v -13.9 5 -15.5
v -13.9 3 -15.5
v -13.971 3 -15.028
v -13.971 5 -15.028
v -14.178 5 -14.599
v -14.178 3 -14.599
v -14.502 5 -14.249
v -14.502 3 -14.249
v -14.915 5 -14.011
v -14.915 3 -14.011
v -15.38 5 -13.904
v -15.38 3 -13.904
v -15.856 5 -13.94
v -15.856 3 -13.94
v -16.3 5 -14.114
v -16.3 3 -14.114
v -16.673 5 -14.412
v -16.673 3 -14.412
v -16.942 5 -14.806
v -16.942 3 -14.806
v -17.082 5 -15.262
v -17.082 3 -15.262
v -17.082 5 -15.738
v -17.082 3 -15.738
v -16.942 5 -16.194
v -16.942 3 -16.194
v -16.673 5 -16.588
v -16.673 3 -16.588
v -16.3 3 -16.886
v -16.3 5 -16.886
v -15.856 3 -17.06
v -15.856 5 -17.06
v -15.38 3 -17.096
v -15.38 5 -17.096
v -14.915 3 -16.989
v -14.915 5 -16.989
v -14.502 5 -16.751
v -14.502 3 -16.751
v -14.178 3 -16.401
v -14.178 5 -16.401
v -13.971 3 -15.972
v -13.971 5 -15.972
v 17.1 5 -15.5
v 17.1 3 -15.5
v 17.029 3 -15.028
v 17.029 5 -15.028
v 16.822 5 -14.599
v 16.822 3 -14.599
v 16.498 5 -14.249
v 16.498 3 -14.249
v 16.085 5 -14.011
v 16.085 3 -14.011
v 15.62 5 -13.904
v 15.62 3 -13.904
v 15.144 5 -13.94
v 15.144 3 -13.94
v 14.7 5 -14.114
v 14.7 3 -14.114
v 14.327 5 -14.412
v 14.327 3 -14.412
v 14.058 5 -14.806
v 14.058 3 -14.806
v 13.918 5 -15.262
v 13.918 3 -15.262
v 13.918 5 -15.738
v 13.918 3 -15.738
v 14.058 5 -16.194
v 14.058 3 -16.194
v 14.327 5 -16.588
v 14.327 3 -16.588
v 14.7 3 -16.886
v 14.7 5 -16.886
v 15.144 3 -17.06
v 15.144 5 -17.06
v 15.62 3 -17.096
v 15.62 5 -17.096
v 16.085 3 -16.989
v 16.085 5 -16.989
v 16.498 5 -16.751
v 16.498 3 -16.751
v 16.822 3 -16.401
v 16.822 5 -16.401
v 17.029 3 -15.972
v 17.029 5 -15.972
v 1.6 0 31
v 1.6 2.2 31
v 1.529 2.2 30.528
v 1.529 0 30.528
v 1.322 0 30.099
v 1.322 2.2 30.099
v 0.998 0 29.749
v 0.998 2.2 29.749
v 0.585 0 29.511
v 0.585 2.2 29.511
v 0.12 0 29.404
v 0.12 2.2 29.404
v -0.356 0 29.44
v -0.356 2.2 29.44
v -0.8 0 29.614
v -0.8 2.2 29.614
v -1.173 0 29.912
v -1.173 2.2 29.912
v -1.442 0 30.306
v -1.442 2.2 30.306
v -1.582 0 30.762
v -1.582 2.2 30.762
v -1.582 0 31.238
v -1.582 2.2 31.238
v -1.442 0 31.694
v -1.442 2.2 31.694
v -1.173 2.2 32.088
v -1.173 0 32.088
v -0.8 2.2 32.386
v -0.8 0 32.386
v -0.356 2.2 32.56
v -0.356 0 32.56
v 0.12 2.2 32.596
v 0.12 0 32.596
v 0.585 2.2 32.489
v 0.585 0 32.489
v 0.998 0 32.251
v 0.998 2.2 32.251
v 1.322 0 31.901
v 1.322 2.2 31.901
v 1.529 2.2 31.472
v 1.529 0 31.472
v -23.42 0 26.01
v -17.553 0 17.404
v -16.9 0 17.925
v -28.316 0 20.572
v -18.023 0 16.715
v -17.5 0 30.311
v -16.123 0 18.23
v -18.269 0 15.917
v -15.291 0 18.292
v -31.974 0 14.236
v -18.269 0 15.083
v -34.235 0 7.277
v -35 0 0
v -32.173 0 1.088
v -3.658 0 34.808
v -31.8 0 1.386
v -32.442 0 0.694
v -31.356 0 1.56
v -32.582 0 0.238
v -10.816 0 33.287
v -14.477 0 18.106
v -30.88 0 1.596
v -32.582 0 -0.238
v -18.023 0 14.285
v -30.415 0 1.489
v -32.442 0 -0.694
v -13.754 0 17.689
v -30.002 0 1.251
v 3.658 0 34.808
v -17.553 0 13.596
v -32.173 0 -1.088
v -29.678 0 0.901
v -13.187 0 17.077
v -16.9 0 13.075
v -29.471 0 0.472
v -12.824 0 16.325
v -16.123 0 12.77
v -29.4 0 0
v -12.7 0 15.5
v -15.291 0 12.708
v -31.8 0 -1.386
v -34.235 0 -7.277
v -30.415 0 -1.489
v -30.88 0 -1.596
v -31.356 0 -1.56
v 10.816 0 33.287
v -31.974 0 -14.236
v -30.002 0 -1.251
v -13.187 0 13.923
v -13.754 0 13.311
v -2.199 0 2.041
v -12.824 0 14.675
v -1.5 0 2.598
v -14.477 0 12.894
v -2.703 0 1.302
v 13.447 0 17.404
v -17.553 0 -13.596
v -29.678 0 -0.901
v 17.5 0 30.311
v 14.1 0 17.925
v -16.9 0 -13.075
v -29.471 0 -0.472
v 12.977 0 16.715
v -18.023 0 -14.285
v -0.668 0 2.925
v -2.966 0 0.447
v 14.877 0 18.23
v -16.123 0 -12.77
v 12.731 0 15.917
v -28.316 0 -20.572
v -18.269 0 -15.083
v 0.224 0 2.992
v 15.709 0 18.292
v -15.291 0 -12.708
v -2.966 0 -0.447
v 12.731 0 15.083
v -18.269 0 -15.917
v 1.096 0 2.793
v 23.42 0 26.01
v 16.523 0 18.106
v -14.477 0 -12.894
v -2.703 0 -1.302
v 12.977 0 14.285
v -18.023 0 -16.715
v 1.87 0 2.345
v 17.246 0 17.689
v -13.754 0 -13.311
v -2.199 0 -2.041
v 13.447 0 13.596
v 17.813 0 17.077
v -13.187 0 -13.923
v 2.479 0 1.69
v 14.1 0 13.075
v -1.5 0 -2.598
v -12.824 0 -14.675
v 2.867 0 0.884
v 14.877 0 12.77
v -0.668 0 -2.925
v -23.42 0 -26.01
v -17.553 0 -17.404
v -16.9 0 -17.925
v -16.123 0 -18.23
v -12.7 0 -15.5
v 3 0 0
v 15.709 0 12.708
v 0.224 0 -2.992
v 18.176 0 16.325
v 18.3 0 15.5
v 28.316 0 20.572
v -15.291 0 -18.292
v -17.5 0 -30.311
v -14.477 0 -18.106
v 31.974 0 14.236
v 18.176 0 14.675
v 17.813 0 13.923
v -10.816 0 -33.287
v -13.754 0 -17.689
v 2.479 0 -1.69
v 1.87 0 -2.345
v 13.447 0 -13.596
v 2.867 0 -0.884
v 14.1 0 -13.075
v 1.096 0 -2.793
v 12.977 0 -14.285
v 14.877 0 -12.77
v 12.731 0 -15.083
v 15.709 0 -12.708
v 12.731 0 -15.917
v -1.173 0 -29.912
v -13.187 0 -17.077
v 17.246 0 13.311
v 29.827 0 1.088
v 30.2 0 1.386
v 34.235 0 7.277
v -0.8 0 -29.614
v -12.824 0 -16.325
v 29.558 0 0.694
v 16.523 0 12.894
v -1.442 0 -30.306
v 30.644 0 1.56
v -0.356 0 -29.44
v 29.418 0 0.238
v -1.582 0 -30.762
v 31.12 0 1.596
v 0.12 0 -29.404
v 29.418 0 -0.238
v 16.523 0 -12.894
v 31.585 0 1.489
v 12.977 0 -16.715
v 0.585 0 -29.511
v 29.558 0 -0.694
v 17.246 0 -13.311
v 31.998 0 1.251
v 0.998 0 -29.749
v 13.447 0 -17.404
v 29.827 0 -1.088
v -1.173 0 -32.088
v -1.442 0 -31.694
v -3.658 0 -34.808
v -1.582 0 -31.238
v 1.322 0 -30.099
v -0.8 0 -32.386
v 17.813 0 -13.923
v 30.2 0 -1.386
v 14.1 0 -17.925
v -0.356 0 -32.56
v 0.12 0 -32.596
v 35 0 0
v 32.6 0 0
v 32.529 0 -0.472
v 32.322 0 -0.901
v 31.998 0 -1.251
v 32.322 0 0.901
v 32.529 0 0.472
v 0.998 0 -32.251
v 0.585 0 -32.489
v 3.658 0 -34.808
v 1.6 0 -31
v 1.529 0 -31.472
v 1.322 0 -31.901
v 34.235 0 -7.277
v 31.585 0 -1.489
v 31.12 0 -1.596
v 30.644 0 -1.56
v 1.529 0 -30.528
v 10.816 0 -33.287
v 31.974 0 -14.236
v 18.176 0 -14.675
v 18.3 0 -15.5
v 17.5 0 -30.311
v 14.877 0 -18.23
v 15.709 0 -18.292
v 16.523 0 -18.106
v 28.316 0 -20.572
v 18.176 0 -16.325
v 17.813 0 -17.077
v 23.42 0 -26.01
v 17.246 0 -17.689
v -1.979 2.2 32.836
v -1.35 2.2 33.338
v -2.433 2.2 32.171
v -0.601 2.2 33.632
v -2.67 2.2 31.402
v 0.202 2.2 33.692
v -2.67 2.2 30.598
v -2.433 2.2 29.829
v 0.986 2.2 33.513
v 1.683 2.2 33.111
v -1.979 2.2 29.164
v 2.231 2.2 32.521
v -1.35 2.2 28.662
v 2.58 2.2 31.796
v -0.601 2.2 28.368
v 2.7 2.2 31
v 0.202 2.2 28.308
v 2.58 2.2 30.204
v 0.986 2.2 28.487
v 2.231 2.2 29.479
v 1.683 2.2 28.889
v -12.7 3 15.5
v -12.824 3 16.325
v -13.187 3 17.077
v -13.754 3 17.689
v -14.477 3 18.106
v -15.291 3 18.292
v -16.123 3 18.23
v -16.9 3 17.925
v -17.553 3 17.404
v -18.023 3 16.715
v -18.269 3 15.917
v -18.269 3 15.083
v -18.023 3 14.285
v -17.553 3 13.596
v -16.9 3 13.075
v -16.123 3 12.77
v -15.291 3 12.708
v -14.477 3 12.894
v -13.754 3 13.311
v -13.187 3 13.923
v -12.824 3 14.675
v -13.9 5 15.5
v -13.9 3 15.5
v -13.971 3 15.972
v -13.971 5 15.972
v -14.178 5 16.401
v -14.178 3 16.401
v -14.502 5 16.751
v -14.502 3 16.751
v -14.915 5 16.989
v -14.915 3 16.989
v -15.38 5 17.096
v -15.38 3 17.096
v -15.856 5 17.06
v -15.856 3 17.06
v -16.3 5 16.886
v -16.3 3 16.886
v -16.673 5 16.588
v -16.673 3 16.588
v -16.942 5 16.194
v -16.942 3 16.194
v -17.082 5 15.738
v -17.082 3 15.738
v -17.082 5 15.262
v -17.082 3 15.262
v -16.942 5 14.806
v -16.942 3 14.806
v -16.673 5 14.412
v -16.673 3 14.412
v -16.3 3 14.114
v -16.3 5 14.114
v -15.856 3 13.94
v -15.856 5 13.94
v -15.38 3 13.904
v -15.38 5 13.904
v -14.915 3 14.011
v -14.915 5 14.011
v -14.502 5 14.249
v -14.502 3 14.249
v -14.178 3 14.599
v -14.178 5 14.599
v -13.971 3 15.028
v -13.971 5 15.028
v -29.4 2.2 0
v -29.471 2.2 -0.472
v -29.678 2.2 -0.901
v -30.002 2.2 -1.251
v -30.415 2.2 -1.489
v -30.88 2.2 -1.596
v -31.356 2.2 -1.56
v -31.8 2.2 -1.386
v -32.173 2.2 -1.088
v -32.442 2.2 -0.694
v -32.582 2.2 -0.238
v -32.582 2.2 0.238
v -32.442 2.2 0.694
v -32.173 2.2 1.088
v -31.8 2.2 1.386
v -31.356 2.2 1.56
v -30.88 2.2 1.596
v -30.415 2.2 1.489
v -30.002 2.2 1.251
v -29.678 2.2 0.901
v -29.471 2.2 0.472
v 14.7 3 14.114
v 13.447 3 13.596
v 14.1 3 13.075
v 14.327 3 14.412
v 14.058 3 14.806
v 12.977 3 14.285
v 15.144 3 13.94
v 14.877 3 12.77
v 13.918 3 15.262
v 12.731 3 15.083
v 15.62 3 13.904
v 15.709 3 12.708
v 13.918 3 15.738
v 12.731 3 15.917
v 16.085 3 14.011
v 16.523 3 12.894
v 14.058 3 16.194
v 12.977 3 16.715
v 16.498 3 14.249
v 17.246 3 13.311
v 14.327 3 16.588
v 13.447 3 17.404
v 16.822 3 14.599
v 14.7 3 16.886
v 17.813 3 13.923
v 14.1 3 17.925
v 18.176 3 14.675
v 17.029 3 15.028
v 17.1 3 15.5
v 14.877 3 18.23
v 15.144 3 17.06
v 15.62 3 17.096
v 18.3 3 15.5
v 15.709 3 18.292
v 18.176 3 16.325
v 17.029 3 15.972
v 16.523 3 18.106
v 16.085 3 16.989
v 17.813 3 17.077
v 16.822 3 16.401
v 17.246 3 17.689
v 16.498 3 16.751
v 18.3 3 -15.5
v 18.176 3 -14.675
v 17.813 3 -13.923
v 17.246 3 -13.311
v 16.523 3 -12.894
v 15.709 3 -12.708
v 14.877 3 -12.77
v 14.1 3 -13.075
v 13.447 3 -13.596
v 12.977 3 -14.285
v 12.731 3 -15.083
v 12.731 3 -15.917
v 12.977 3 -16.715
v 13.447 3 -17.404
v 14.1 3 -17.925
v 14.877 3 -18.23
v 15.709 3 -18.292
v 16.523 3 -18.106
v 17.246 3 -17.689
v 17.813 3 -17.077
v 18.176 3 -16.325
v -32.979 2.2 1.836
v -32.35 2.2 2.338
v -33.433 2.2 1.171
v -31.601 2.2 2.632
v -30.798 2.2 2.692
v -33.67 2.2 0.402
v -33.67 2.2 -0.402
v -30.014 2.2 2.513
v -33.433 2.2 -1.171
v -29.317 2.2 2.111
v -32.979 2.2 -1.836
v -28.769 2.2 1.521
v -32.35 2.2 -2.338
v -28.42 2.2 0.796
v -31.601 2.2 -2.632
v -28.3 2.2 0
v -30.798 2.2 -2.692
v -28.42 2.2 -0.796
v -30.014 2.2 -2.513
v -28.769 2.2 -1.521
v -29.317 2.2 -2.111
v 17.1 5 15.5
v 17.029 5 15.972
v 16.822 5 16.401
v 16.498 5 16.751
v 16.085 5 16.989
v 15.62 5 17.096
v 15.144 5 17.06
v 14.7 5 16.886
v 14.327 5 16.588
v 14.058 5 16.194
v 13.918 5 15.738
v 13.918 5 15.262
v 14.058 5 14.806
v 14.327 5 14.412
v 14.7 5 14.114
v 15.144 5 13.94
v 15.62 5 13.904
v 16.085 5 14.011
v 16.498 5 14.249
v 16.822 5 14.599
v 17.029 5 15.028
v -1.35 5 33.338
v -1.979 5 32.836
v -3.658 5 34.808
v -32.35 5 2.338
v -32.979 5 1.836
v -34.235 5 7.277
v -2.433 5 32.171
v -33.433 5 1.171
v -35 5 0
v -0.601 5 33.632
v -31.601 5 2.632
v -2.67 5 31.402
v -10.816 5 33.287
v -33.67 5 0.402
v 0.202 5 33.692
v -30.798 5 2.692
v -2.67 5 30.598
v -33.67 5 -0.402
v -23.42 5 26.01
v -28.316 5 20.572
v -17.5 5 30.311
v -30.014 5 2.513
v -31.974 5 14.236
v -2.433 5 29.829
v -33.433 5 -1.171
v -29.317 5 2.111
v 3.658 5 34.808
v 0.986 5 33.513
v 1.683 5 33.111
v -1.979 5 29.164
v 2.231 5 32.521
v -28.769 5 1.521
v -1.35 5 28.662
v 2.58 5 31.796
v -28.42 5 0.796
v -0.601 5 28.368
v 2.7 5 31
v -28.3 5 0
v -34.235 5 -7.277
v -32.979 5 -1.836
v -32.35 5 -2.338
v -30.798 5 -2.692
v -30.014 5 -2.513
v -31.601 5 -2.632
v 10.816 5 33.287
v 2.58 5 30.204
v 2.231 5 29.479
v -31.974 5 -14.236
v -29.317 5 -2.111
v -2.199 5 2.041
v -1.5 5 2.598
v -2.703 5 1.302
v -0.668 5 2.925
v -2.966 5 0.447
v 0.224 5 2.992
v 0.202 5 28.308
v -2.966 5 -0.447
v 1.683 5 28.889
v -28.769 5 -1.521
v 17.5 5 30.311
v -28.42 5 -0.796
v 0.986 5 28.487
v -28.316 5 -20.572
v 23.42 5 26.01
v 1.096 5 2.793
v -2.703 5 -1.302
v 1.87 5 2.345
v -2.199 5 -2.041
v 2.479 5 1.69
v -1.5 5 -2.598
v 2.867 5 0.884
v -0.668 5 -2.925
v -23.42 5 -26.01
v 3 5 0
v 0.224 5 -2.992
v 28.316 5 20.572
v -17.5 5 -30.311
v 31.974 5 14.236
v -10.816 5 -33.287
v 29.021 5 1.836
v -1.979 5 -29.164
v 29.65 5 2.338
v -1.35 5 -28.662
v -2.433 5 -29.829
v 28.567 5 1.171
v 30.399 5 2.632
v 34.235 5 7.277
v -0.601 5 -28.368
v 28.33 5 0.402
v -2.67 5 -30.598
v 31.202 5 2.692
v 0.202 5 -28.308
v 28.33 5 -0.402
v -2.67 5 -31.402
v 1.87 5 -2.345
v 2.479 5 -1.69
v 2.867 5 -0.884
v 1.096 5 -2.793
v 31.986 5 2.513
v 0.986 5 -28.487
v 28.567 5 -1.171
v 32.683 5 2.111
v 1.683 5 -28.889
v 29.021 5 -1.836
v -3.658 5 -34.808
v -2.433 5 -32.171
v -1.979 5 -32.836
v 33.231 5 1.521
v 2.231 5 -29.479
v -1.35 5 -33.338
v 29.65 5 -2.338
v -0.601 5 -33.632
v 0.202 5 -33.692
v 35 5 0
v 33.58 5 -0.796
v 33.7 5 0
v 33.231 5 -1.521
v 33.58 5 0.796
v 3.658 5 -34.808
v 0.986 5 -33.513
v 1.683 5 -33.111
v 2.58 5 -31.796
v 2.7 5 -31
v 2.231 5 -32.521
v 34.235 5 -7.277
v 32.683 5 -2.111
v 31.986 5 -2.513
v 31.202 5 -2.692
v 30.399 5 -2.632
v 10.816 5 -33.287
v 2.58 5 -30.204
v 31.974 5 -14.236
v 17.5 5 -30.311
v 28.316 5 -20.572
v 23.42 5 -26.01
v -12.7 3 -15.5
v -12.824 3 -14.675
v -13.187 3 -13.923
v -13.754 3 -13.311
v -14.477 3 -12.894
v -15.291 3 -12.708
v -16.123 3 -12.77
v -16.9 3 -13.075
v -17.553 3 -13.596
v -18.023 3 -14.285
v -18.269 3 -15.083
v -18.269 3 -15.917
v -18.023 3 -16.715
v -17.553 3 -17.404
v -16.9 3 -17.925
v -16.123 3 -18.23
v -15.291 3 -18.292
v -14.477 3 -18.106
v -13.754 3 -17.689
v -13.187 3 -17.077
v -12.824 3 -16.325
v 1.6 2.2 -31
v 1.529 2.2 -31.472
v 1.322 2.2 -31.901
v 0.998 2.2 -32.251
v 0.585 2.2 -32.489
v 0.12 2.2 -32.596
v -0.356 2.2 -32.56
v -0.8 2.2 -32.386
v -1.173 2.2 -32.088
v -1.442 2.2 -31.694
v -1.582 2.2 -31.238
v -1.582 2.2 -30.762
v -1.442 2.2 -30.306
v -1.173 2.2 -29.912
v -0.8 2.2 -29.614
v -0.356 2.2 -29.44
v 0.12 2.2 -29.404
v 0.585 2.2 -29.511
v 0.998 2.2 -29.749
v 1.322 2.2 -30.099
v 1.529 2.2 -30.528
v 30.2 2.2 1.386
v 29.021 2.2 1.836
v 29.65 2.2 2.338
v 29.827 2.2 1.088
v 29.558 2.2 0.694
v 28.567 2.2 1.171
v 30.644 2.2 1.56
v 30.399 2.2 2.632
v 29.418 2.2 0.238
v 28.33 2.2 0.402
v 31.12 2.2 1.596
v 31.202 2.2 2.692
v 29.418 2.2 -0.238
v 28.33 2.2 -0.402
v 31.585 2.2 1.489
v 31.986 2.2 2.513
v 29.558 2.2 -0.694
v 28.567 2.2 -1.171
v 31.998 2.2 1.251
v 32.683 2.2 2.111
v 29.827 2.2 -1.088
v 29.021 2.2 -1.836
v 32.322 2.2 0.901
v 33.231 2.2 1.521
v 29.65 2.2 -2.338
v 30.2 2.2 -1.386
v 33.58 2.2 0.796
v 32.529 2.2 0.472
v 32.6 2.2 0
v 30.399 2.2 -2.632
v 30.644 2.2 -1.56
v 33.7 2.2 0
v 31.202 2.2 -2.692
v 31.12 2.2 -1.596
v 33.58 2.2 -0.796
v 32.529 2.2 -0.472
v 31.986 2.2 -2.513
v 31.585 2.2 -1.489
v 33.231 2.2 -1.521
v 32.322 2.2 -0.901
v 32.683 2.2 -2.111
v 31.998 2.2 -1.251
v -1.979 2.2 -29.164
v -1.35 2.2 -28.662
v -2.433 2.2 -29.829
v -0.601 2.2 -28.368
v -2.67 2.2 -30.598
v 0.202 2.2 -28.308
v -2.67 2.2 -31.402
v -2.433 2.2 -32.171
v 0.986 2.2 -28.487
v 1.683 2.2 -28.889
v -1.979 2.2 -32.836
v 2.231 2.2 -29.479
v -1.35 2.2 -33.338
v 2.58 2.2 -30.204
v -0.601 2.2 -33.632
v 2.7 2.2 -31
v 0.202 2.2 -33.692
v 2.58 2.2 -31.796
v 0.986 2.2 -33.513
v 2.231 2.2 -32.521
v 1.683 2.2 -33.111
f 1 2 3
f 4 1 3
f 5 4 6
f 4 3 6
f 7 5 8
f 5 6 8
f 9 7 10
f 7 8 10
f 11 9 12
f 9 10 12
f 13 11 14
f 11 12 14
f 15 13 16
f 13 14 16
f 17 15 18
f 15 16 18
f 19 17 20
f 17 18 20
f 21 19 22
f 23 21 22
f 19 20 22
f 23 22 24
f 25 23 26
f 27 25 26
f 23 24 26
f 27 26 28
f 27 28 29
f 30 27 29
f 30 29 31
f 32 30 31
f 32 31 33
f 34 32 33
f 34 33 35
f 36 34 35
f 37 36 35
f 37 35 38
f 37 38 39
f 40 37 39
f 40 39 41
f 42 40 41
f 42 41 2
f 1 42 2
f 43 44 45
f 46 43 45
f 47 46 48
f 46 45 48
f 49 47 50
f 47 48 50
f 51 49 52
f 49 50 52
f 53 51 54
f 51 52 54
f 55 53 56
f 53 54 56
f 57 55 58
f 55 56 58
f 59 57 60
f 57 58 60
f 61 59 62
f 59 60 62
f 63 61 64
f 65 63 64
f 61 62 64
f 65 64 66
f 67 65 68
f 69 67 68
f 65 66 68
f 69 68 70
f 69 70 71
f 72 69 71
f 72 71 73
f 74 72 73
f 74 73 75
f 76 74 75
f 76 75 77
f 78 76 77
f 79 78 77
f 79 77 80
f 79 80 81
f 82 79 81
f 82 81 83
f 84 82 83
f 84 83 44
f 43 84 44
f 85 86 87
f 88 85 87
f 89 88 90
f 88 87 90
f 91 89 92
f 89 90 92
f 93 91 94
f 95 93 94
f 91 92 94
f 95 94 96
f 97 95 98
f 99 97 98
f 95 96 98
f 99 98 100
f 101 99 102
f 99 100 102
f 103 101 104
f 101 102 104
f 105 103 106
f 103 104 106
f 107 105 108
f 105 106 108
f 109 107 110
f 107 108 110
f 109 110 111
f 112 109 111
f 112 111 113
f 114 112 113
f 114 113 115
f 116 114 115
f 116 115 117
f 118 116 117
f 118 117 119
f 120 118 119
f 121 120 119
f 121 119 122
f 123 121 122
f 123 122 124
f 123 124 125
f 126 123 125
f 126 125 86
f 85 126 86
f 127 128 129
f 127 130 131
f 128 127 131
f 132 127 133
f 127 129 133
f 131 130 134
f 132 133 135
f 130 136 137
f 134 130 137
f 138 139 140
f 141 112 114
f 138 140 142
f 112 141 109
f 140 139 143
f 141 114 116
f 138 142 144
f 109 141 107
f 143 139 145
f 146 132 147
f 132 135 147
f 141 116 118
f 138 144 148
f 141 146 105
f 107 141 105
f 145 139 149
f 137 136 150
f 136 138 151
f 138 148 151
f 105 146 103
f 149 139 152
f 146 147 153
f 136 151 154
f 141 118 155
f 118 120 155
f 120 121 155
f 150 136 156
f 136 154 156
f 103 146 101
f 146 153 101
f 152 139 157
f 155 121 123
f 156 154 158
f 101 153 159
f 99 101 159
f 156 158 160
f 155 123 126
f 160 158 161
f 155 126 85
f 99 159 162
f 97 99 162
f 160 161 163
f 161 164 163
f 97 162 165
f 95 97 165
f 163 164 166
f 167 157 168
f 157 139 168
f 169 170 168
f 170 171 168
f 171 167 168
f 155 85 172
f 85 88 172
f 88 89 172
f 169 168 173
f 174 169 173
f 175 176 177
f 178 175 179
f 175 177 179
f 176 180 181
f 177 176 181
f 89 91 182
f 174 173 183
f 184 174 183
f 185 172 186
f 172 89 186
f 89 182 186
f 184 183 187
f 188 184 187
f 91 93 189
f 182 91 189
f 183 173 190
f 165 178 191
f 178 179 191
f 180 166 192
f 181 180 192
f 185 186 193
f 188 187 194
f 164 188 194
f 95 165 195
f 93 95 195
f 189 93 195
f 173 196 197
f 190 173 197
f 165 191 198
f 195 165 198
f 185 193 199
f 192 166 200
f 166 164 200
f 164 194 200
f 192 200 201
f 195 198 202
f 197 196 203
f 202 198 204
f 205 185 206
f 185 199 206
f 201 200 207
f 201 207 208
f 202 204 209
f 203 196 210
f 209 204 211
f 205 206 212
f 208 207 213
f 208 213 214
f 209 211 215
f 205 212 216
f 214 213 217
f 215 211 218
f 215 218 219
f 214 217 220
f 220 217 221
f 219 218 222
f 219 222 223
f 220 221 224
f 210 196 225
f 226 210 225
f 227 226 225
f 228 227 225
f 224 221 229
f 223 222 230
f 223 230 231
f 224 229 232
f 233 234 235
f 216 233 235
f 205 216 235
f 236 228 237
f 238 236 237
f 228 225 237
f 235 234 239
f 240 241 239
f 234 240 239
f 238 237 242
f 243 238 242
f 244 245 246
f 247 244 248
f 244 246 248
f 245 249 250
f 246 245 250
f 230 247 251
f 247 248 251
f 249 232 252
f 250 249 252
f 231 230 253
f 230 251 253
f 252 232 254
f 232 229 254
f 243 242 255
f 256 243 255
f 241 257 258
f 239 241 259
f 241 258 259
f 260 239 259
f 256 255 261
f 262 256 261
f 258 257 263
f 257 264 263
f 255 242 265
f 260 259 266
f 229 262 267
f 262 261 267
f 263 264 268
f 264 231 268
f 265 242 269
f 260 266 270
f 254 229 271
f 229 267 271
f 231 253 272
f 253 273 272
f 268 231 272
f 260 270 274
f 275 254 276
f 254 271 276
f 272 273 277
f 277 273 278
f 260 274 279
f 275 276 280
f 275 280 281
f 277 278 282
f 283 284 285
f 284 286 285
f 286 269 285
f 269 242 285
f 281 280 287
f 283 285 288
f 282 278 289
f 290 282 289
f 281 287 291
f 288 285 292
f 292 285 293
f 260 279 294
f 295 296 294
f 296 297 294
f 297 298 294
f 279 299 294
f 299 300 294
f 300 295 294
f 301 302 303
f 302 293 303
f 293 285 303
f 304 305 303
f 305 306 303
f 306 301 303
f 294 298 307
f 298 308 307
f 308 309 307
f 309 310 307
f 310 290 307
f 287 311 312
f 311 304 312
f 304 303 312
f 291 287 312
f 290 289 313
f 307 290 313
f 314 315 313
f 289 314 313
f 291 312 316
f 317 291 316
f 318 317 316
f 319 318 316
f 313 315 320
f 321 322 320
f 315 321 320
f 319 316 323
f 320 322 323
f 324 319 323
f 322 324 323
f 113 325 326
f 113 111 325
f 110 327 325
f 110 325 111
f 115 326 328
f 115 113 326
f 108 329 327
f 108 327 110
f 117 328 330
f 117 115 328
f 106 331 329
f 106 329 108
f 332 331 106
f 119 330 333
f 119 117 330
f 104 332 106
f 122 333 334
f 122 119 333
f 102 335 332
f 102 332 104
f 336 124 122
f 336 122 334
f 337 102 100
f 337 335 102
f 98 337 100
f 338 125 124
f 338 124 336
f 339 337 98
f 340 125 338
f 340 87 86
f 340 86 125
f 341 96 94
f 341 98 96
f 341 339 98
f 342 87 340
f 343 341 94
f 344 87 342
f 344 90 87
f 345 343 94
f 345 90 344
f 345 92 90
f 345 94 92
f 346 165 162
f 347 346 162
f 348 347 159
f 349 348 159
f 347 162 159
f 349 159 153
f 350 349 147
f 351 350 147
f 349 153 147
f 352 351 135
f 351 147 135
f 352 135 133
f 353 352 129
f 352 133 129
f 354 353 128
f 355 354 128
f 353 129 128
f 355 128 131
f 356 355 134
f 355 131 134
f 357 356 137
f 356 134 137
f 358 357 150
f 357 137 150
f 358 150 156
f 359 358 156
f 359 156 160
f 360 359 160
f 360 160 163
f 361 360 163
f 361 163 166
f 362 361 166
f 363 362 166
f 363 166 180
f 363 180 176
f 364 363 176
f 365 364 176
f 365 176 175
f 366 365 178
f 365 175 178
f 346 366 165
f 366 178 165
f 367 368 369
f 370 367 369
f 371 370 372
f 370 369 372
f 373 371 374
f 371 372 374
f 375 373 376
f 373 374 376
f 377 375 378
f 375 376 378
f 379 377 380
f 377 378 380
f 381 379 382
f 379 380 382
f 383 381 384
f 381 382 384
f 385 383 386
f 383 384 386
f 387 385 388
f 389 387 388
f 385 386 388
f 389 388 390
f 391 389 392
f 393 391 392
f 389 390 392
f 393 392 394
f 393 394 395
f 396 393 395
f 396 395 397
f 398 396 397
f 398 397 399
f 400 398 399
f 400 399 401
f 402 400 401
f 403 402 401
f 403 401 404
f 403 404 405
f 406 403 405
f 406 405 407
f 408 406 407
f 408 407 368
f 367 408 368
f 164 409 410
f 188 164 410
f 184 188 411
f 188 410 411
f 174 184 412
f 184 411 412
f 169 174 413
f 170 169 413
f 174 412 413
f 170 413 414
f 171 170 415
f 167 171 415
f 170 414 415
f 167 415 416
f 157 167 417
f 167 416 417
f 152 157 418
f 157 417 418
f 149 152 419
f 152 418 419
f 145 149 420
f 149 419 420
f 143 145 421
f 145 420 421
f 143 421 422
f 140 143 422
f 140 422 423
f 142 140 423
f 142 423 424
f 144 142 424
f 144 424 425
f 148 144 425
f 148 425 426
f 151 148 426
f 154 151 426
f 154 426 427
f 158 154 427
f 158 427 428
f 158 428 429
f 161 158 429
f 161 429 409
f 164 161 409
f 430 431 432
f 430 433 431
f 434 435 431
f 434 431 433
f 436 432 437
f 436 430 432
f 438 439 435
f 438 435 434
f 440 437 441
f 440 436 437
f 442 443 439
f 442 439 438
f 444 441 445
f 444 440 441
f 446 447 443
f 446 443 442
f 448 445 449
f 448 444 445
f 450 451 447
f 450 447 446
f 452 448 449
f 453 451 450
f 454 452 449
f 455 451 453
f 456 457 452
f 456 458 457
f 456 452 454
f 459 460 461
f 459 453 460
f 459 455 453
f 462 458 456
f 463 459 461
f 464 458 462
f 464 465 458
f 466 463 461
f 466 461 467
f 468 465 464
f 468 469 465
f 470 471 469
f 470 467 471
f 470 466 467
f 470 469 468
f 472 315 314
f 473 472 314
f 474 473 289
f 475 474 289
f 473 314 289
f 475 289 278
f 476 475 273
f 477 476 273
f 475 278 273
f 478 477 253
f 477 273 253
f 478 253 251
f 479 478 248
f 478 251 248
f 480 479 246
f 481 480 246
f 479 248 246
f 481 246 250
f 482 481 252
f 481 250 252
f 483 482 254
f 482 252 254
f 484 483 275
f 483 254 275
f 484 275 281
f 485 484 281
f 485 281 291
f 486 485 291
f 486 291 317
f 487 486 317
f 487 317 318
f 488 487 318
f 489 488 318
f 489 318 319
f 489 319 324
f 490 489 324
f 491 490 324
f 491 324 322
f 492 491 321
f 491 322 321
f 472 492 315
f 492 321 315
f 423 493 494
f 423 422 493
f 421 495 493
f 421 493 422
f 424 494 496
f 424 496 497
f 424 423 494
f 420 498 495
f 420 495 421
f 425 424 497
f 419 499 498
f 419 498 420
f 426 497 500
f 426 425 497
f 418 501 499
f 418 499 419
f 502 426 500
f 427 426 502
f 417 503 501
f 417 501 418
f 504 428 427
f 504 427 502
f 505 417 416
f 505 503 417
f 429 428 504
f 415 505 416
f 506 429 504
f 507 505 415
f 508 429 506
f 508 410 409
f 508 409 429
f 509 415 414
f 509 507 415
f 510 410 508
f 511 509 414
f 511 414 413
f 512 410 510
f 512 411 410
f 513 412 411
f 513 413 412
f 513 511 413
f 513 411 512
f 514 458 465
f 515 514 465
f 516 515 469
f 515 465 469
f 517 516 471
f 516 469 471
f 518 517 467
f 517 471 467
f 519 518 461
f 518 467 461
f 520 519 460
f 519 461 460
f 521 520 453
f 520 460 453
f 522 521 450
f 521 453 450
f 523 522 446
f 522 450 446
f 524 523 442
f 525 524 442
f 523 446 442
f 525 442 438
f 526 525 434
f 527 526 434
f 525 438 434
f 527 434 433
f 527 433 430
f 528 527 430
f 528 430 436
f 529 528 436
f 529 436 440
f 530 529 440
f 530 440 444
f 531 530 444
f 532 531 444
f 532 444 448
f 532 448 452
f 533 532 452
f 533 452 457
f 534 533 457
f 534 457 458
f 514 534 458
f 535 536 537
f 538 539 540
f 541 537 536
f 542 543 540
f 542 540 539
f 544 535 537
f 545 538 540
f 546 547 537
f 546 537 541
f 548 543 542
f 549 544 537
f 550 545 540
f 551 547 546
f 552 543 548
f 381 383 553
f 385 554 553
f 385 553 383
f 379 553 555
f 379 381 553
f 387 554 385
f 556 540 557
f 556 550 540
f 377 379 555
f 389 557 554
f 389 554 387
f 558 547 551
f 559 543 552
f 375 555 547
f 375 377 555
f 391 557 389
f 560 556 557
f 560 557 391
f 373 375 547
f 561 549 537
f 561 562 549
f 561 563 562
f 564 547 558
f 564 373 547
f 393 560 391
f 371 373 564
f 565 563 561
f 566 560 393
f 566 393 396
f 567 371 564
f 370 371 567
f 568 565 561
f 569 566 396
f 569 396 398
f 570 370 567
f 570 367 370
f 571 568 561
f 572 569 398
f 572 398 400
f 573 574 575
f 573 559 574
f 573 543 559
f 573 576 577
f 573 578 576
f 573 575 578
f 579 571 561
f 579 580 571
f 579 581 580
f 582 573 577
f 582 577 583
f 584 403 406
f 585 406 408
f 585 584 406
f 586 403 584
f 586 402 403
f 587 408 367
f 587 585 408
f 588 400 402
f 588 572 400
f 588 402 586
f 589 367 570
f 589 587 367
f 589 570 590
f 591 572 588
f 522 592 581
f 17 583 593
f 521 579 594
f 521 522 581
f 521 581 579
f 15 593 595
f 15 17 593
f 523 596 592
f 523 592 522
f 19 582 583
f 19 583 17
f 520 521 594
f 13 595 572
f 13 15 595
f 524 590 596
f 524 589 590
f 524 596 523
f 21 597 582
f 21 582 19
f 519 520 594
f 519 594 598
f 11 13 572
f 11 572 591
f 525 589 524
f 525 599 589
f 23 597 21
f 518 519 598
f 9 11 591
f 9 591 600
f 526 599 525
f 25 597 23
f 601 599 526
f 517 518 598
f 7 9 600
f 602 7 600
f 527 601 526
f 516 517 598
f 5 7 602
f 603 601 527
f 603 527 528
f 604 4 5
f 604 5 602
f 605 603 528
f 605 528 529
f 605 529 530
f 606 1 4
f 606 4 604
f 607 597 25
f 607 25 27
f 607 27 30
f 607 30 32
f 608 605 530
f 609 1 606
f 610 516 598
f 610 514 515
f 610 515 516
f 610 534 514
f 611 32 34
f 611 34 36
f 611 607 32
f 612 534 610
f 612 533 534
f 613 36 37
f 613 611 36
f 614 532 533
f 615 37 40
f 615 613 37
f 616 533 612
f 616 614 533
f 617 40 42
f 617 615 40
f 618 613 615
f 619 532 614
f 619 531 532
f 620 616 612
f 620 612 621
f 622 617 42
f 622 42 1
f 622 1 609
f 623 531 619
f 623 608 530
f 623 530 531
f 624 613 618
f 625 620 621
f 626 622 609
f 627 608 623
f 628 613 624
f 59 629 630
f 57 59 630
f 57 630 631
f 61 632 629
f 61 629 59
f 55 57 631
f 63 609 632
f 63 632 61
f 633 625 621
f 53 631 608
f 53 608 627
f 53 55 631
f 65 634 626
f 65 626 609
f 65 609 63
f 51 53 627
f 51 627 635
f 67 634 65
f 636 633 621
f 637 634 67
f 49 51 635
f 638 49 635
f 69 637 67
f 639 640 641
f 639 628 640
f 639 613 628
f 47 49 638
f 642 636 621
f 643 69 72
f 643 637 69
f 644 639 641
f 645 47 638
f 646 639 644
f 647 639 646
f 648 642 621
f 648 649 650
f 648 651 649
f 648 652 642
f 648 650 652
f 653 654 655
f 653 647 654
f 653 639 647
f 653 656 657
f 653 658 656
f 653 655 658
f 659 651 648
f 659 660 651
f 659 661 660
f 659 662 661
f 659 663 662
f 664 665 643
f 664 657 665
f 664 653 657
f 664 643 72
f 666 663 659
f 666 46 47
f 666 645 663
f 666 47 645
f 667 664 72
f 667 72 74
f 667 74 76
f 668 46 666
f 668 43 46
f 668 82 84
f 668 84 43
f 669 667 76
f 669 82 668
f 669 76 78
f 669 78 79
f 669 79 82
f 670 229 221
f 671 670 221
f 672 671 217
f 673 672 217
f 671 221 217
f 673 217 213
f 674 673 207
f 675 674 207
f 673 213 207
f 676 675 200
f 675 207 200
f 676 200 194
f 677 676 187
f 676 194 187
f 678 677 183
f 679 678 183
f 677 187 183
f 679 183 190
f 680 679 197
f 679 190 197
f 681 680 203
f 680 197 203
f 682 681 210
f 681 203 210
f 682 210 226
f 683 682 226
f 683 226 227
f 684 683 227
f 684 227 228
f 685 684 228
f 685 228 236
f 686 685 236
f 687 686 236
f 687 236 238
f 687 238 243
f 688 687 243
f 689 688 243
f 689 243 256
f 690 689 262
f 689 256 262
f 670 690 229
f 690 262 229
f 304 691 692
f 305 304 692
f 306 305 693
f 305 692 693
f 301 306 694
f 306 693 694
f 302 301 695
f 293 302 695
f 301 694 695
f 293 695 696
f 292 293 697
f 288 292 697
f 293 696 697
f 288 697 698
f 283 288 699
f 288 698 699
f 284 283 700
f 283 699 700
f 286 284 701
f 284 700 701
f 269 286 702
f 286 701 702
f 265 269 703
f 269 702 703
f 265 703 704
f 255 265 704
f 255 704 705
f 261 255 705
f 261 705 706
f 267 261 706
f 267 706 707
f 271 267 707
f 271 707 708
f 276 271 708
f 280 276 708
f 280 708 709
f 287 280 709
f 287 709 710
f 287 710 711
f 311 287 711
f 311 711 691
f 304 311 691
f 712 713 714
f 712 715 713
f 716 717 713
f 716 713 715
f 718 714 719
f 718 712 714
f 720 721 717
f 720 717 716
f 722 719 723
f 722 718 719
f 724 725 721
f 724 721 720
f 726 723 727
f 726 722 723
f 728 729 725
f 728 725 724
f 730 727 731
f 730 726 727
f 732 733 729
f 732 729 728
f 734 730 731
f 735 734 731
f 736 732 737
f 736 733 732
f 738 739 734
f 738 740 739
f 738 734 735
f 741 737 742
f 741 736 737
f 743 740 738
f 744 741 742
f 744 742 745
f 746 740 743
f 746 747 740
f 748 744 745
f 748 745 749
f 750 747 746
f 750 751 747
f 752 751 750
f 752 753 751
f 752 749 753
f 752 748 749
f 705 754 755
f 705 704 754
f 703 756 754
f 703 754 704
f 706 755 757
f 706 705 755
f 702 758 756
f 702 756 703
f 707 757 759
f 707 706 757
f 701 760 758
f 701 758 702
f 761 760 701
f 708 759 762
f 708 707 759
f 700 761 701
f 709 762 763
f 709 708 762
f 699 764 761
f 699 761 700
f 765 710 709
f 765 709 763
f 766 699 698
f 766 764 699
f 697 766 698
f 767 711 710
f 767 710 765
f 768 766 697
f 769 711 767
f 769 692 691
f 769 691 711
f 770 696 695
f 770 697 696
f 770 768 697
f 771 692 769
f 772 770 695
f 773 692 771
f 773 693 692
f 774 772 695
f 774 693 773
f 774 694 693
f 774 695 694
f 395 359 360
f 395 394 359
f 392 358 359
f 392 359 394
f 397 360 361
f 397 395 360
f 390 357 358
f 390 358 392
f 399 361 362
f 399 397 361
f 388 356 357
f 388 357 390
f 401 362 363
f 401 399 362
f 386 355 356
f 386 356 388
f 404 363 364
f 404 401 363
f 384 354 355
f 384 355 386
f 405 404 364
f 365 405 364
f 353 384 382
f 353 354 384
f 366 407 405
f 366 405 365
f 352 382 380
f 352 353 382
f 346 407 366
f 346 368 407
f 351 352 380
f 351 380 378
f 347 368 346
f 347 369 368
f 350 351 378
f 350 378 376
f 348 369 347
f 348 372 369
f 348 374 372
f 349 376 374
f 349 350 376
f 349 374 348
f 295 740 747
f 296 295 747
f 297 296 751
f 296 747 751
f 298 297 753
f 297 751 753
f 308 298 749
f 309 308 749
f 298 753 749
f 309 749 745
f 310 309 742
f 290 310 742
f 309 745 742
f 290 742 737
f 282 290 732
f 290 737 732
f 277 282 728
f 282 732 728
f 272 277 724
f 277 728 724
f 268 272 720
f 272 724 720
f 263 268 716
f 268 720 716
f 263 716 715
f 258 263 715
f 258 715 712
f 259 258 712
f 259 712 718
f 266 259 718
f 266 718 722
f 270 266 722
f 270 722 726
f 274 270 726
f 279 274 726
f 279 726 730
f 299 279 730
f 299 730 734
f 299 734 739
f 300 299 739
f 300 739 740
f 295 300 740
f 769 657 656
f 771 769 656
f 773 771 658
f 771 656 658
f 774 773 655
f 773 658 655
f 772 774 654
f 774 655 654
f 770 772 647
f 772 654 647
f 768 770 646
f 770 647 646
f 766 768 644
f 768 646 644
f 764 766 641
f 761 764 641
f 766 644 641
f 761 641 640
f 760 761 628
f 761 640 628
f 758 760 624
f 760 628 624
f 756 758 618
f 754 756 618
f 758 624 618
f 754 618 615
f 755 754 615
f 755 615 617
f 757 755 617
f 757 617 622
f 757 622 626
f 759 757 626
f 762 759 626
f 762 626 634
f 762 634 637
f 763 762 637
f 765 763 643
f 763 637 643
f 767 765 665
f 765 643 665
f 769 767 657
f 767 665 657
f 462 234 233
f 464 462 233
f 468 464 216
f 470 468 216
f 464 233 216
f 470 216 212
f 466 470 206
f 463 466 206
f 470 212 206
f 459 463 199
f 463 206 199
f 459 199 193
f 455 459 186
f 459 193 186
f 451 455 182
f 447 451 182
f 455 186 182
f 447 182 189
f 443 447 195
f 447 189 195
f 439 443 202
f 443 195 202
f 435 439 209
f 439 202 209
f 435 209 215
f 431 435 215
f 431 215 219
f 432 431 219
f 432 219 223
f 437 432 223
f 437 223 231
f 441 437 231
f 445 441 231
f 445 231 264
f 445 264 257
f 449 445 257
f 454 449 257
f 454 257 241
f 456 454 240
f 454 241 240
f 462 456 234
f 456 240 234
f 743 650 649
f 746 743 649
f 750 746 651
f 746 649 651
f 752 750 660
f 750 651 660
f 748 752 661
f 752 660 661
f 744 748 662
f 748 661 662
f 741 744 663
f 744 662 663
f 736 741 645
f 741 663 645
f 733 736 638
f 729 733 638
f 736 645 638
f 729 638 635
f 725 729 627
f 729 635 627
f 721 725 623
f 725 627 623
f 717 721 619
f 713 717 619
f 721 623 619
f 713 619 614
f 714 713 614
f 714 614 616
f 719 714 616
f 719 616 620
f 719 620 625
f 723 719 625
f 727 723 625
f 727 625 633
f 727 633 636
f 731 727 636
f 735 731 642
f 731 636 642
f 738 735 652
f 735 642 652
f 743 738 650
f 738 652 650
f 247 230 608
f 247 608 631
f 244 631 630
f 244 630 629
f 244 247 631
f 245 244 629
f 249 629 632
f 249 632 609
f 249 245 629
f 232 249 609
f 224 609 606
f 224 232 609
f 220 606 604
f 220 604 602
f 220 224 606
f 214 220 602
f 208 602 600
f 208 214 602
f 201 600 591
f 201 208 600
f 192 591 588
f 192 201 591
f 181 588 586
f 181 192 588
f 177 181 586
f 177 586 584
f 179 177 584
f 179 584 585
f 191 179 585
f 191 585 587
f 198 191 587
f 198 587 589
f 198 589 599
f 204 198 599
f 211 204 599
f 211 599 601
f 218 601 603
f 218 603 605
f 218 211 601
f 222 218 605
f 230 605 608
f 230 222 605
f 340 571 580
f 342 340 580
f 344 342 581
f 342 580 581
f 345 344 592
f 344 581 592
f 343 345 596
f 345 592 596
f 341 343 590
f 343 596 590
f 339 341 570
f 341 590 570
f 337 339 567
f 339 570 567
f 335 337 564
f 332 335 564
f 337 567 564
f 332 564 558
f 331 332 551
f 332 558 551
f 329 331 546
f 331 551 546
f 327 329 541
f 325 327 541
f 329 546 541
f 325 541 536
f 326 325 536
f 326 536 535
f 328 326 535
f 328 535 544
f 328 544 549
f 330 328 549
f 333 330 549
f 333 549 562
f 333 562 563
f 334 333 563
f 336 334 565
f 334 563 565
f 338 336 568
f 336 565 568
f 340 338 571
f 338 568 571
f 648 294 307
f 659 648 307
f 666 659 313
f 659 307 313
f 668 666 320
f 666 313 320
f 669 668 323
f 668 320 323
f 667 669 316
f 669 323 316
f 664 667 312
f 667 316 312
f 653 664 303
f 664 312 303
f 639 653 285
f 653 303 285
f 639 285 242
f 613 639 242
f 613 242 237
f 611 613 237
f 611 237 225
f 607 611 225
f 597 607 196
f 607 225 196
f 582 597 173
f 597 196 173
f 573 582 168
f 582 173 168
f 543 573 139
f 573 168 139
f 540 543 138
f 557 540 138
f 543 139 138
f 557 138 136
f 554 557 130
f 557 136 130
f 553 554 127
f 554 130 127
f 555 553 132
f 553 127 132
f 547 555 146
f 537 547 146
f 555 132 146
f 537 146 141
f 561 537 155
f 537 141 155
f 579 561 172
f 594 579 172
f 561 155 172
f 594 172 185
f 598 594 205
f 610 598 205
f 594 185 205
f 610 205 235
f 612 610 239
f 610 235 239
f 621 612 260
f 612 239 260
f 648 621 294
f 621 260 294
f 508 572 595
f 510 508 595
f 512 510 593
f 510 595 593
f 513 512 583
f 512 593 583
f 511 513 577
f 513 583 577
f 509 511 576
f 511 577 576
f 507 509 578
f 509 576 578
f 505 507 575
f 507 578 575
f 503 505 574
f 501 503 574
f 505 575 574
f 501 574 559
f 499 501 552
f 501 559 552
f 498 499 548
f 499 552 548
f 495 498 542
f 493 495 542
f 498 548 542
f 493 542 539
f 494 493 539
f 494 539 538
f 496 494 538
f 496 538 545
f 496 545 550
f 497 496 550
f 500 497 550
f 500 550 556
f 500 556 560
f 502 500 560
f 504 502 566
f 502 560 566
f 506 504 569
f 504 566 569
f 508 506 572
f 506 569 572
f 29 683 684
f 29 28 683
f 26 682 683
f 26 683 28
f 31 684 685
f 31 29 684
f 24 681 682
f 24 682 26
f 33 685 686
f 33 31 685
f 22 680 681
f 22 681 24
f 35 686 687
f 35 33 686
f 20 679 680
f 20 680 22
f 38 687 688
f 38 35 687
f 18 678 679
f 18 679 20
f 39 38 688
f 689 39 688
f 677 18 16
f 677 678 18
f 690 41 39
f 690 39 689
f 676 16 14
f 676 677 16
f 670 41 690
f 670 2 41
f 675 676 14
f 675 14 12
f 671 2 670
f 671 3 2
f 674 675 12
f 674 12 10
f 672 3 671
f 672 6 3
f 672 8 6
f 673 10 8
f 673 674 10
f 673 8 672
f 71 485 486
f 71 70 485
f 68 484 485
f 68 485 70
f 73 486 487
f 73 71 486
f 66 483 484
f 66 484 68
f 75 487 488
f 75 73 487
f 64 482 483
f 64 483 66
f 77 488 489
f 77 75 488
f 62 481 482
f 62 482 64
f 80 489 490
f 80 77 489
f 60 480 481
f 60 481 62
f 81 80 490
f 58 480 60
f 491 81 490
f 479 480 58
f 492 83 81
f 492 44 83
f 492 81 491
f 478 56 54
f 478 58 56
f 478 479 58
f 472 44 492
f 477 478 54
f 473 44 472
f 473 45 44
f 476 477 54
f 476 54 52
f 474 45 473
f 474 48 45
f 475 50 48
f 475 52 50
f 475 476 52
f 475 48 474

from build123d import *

# Parameters (mm, degrees)
SKETCH1_R           = 35
SKETCH1_R_2         = 3
BOSS_EXTRUDE1_DEPTH = 5
SKETCH2_R           = 1.6
CUT_EXTRUDE1_DEPTH  = 5
SKETCH4_R           = 2.8
SKETCH4_R_2         = 1.6
CUT_EXTRUDE2_DEPTH  = 3
SKETCH5_R           = 1.6
CUT_EXTRUDE3_DEPTH  = 10
SKETCH6_R           = 2.7
CUT_EXTRUDE4_DEPTH  = 2.8


with BuildPart() as part:
    # Sketch1 → Boss-Extrude1 (new body)
    with BuildSketch(Plane(origin=(0, 0, 0), x_dir=(1, 0, 0), z_dir=(0, 1, 0))):
        Circle(SKETCH1_R)
        Circle(SKETCH1_R_2, mode=Mode.SUBTRACT)
    extrude(amount=BOSS_EXTRUDE1_DEPTH)

    # Sketch2 → Cut-Extrude1 (cut)
    with BuildSketch(Plane.XZ):
        with Locations((15.5, 15.5)):
            Circle(SKETCH2_R)
        with Locations((15.5, -15.5)):
            Circle(SKETCH2_R)
        with Locations((-15.5, -15.5)):
            Circle(SKETCH2_R)
        with Locations((-15.5, 15.5)):
            Circle(SKETCH2_R)
    extrude(amount=-CUT_EXTRUDE1_DEPTH, mode=Mode.SUBTRACT)

    # Sketch4 → Cut-Extrude2 (cut)
    with BuildSketch(Plane.XZ):
        with Locations((-15.5, 15.5)):
            Circle(SKETCH4_R)
        with Locations((-15.5, 15.5)):
            Circle(SKETCH4_R_2, mode=Mode.SUBTRACT)
        with Locations((15.5, 15.5)):
            Circle(SKETCH4_R)
        with Locations((15.5, 15.5)):
            Circle(SKETCH4_R_2, mode=Mode.SUBTRACT)
        with Locations((15.5, -15.5)):
            Circle(SKETCH4_R)
        with Locations((15.5, -15.5)):
            Circle(SKETCH4_R_2, mode=Mode.SUBTRACT)
        with Locations((-15.5, -15.5)):
            Circle(SKETCH4_R)
        with Locations((-15.5, -15.5)):
            Circle(SKETCH4_R_2, mode=Mode.SUBTRACT)
    extrude(amount=-CUT_EXTRUDE2_DEPTH, mode=Mode.SUBTRACT)

    # Sketch5 → Cut-Extrude3 (cut)
    with BuildSketch(Plane(origin=(0, 5, 0), x_dir=(1, 0, 0), z_dir=(0, 1, 0))):
        with Locations((0, 31)):
            Circle(SKETCH5_R)
        with Locations((31, 0)):
            Circle(SKETCH5_R)
        with Locations((0, -31)):
            Circle(SKETCH5_R)
        with Locations((-31, 0)):
            Circle(SKETCH5_R)
    extrude(amount=-CUT_EXTRUDE3_DEPTH, mode=Mode.SUBTRACT)

    # Sketch6 → Cut-Extrude4 (cut)
    with BuildSketch(Plane(origin=(0, 5, 0), x_dir=(1, 0, 0), z_dir=(0, 1, 0))):
        with Locations((0, 31)):
            Circle(SKETCH6_R)
        with Locations((31, 0)):
            Circle(SKETCH6_R)
        with Locations((0, -31)):
            Circle(SKETCH6_R)
        with Locations((-31, 0)):
            Circle(SKETCH6_R)
    extrude(amount=-CUT_EXTRUDE4_DEPTH, mode=Mode.SUBTRACT)


solid = part.part
